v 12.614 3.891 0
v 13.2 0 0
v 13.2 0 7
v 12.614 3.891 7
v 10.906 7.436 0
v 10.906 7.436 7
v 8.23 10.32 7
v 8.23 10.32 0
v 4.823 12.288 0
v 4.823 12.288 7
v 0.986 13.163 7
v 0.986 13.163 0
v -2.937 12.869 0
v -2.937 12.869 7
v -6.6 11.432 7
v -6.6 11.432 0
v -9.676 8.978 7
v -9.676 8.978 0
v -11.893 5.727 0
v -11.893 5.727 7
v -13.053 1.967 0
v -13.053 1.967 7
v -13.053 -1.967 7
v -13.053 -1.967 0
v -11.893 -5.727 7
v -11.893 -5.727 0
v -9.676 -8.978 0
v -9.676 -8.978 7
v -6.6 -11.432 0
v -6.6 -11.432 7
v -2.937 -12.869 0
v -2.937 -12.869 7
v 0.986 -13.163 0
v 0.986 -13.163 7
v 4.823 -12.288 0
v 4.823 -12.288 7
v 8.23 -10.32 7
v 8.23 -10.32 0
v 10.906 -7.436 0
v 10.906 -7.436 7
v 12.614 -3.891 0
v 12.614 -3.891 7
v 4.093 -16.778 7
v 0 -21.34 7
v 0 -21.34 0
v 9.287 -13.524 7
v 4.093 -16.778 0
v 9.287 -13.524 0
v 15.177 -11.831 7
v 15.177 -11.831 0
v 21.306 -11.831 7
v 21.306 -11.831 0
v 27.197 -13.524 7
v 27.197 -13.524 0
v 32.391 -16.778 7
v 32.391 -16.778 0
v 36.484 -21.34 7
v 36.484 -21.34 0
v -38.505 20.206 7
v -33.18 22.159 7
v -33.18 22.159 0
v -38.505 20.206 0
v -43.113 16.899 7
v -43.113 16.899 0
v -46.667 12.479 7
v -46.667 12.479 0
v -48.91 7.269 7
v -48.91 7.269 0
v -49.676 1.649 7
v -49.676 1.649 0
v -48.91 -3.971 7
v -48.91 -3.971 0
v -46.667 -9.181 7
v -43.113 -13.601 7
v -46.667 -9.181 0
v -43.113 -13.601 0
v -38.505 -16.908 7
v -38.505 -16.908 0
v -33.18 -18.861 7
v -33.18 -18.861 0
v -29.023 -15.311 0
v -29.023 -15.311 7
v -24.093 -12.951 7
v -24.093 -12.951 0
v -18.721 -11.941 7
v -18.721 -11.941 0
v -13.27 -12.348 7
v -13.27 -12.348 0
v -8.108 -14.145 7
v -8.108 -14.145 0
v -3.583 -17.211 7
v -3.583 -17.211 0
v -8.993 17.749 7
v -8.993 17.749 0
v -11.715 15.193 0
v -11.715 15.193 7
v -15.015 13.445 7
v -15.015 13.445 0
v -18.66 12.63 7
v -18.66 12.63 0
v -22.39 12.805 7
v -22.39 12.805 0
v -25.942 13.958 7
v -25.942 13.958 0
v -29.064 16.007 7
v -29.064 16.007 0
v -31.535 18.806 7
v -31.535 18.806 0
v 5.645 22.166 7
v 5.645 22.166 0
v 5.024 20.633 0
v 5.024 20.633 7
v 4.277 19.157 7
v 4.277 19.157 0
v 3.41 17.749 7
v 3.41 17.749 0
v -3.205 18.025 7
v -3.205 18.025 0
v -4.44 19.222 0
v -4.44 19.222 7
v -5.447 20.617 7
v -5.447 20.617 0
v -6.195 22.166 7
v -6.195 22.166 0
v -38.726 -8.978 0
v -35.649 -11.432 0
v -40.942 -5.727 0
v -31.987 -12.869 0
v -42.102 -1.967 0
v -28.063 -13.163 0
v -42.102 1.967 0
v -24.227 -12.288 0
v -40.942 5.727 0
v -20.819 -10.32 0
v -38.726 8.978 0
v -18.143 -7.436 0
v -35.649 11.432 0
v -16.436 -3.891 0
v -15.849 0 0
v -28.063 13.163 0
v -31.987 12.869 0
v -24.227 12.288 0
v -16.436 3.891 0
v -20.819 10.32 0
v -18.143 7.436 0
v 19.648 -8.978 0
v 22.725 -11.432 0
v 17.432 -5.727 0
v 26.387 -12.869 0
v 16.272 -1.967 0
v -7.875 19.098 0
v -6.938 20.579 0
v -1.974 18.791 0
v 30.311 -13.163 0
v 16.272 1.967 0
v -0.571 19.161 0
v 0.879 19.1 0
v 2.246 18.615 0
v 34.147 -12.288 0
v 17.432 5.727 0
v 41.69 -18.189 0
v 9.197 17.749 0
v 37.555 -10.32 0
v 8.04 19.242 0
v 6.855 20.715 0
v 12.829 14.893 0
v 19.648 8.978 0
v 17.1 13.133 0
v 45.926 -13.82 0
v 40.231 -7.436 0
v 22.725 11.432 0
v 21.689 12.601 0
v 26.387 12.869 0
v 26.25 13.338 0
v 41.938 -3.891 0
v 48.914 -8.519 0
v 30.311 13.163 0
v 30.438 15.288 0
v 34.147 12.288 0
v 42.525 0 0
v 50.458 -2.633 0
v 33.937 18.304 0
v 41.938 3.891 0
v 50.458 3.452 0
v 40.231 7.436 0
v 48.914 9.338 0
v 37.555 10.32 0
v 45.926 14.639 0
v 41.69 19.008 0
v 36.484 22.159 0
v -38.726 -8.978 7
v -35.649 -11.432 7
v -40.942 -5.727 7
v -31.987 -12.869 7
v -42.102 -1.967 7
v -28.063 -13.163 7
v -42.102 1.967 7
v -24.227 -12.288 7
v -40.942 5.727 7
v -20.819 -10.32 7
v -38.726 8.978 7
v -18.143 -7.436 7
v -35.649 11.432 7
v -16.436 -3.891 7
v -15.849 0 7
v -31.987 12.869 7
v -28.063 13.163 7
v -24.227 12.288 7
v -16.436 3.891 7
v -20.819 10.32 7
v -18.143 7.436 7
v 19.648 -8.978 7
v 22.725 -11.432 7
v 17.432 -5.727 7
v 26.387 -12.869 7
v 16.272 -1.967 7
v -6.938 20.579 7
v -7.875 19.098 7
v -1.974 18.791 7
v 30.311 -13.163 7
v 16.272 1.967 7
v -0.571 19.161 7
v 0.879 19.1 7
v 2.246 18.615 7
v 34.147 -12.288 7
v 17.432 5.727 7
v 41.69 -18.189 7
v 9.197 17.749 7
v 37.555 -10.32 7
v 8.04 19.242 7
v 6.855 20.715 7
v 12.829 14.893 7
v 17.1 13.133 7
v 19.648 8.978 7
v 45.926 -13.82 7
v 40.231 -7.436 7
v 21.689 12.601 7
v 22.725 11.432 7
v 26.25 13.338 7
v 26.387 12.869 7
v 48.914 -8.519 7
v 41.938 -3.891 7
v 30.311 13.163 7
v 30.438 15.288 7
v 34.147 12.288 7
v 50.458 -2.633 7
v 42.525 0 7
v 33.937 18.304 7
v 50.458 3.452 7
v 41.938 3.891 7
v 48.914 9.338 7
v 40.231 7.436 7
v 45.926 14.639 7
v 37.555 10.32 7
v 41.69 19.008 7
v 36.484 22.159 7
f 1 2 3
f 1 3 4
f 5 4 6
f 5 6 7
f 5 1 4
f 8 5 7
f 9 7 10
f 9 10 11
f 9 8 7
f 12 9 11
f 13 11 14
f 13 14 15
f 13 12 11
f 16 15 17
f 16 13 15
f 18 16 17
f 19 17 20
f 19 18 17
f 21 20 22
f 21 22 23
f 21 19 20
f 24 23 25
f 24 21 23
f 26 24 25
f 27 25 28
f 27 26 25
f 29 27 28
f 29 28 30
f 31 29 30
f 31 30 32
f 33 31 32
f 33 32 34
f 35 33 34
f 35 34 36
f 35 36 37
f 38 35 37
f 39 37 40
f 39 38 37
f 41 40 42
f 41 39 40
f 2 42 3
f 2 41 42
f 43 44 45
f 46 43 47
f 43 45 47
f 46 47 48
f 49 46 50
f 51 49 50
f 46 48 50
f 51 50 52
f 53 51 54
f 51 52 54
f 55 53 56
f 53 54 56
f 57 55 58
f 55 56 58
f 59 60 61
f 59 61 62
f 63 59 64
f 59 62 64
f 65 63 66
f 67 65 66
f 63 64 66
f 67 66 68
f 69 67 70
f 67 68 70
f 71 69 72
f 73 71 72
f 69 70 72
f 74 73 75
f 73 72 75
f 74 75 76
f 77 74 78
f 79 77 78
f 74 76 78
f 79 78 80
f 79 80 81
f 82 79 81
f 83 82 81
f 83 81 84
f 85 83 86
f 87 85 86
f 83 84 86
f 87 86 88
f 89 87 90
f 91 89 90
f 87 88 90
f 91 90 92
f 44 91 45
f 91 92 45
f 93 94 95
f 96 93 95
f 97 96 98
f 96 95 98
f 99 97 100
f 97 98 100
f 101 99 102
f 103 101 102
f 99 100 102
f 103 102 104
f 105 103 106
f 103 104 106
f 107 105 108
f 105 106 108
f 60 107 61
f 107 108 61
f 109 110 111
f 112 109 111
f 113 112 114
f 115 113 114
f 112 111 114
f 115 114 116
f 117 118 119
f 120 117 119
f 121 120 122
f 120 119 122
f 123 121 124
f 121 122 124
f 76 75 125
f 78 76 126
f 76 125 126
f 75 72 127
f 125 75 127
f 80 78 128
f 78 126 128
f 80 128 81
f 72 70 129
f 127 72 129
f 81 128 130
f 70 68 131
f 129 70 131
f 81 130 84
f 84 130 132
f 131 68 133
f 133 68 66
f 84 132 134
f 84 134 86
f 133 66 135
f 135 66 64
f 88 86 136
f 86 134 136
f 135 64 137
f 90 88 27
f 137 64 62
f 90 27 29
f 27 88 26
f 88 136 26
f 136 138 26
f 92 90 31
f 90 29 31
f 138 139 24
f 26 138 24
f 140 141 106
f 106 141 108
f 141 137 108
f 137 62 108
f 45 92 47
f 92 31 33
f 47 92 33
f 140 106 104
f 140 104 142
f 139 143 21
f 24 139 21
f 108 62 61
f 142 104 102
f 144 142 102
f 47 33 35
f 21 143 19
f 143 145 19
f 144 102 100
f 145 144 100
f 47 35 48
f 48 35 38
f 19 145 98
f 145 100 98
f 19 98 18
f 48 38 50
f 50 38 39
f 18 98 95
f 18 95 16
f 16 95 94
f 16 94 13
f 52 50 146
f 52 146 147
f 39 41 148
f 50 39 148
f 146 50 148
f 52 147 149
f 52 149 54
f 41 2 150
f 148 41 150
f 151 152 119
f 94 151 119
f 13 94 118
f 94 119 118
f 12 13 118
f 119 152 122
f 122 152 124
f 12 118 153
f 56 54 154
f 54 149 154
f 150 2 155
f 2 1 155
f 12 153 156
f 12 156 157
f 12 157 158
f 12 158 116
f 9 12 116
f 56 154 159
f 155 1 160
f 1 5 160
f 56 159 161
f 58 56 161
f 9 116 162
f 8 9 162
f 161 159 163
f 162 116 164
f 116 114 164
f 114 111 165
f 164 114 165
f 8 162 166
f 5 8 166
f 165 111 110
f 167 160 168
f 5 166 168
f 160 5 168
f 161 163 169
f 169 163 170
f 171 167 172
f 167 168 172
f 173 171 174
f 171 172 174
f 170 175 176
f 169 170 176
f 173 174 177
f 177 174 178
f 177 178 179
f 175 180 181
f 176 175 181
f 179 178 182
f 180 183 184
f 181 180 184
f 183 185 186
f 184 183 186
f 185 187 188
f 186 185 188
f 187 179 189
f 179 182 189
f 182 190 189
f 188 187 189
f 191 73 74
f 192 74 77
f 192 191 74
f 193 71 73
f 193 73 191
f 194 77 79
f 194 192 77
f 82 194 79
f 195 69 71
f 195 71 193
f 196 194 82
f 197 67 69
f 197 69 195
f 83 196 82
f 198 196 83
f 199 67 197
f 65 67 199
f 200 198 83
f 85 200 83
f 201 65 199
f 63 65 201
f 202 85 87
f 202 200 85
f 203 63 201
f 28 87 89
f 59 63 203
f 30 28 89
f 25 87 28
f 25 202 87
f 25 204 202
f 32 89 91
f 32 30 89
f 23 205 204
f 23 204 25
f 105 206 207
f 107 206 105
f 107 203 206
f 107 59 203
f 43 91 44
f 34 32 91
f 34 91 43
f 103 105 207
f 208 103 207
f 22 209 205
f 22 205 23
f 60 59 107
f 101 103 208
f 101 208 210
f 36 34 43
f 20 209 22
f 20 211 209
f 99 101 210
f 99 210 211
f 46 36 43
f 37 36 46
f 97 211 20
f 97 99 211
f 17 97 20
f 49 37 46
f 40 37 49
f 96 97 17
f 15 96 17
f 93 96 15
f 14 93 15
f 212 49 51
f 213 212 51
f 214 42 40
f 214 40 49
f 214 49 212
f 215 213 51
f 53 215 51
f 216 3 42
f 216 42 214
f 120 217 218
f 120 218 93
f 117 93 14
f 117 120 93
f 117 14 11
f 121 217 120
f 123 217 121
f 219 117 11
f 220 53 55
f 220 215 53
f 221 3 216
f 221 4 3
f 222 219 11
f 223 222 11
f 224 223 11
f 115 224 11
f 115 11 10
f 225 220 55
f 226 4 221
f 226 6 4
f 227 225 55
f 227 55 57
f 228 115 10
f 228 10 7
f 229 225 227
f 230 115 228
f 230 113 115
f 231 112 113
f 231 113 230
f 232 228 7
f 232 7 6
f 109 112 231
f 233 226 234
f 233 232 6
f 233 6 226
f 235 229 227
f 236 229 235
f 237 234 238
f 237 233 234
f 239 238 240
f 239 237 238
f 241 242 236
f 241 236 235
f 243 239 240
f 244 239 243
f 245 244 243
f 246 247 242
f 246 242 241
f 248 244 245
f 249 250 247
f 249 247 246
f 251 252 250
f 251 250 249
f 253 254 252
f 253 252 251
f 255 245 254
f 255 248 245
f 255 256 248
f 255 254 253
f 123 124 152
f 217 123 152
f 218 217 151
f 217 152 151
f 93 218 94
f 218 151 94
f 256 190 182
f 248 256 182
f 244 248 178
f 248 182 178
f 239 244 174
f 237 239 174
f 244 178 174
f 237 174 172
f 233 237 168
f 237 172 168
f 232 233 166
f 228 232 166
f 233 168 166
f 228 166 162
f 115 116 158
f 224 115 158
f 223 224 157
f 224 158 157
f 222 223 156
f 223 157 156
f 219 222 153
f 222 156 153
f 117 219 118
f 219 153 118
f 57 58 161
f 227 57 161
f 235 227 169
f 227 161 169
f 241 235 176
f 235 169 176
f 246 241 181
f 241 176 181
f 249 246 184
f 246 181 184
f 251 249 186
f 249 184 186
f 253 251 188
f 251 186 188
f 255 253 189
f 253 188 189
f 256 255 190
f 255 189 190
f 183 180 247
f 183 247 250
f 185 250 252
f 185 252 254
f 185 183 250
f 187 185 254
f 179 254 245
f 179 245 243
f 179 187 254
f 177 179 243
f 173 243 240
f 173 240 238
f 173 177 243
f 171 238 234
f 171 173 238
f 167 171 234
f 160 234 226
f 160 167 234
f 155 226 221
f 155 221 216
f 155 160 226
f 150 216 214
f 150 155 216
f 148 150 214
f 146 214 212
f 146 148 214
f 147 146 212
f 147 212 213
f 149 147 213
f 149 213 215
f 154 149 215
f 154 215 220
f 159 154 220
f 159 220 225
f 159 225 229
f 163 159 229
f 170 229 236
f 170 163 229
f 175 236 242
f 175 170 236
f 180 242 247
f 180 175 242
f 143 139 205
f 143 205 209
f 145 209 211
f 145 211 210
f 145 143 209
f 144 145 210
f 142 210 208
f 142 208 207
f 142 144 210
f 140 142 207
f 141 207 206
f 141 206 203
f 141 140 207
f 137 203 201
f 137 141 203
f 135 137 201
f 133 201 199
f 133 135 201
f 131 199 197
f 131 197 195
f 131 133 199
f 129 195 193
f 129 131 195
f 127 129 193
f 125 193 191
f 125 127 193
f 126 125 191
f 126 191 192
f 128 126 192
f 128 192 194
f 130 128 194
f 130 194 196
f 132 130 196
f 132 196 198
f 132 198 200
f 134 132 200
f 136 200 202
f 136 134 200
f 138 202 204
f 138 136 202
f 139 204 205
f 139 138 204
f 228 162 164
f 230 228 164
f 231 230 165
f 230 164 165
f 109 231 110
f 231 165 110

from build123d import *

# Parameters (mm, degrees)
F0_R     = 13.2
F1_DEPTH = 7


with BuildPart() as f1:
    # F0 (on Top) → F1 (new body)
    with BuildSketch(Plane.XY):
        with BuildLine():
            ThreePointArc((5.644667, 22.165649), (4.665852, 19.88717), (3.409515, 17.749143))
            ThreePointArc((3.409515, 17.749143), (0.156216, 19.184844), (-3.20524, 18.024758))
            ThreePointArc((-3.20524, 18.024758), (-4.974394, 19.897283), (-6.195367, 22.165649))
            ThreePointArc((-6.195367, 22.165649), (-7.382922, 19.823517), (-8.993153, 17.749143))
            ThreePointArc((-8.993153, 17.749143), (-22.389875, 12.804904), (-33.179633, 22.158981))
            ThreePointArc((-33.179633, 22.158981), (-49.675616, 1.648765), (-33.179633, -18.861452))
            ThreePointArc((-33.179633, -18.861452), (-15.982306, -11.966628), (0, -21.339599))
            ThreePointArc((0, -21.339599), (18.241916, -11.616609), (36.483832, -21.339599))
            ThreePointArc((36.483832, -21.339599), (50.653593, 0.409691), (36.483832, 22.158981))
            ThreePointArc((36.483832, 22.158981), (23.994879, 12.812003), (9.197427, 17.749143))
            ThreePointArc((9.197427, 17.749143), (7.450629, 19.981192), (5.644667, 22.165649))
        make_face()
        with Locations((-29.049389, 0)):
            Circle(F0_R, mode=Mode.SUBTRACT)
        Circle(F0_R, mode=Mode.SUBTRACT)
        with Locations((29.32474, 0)):
            Circle(F0_R, mode=Mode.SUBTRACT)
    extrude(amount=F1_DEPTH)


solid = f1.part
